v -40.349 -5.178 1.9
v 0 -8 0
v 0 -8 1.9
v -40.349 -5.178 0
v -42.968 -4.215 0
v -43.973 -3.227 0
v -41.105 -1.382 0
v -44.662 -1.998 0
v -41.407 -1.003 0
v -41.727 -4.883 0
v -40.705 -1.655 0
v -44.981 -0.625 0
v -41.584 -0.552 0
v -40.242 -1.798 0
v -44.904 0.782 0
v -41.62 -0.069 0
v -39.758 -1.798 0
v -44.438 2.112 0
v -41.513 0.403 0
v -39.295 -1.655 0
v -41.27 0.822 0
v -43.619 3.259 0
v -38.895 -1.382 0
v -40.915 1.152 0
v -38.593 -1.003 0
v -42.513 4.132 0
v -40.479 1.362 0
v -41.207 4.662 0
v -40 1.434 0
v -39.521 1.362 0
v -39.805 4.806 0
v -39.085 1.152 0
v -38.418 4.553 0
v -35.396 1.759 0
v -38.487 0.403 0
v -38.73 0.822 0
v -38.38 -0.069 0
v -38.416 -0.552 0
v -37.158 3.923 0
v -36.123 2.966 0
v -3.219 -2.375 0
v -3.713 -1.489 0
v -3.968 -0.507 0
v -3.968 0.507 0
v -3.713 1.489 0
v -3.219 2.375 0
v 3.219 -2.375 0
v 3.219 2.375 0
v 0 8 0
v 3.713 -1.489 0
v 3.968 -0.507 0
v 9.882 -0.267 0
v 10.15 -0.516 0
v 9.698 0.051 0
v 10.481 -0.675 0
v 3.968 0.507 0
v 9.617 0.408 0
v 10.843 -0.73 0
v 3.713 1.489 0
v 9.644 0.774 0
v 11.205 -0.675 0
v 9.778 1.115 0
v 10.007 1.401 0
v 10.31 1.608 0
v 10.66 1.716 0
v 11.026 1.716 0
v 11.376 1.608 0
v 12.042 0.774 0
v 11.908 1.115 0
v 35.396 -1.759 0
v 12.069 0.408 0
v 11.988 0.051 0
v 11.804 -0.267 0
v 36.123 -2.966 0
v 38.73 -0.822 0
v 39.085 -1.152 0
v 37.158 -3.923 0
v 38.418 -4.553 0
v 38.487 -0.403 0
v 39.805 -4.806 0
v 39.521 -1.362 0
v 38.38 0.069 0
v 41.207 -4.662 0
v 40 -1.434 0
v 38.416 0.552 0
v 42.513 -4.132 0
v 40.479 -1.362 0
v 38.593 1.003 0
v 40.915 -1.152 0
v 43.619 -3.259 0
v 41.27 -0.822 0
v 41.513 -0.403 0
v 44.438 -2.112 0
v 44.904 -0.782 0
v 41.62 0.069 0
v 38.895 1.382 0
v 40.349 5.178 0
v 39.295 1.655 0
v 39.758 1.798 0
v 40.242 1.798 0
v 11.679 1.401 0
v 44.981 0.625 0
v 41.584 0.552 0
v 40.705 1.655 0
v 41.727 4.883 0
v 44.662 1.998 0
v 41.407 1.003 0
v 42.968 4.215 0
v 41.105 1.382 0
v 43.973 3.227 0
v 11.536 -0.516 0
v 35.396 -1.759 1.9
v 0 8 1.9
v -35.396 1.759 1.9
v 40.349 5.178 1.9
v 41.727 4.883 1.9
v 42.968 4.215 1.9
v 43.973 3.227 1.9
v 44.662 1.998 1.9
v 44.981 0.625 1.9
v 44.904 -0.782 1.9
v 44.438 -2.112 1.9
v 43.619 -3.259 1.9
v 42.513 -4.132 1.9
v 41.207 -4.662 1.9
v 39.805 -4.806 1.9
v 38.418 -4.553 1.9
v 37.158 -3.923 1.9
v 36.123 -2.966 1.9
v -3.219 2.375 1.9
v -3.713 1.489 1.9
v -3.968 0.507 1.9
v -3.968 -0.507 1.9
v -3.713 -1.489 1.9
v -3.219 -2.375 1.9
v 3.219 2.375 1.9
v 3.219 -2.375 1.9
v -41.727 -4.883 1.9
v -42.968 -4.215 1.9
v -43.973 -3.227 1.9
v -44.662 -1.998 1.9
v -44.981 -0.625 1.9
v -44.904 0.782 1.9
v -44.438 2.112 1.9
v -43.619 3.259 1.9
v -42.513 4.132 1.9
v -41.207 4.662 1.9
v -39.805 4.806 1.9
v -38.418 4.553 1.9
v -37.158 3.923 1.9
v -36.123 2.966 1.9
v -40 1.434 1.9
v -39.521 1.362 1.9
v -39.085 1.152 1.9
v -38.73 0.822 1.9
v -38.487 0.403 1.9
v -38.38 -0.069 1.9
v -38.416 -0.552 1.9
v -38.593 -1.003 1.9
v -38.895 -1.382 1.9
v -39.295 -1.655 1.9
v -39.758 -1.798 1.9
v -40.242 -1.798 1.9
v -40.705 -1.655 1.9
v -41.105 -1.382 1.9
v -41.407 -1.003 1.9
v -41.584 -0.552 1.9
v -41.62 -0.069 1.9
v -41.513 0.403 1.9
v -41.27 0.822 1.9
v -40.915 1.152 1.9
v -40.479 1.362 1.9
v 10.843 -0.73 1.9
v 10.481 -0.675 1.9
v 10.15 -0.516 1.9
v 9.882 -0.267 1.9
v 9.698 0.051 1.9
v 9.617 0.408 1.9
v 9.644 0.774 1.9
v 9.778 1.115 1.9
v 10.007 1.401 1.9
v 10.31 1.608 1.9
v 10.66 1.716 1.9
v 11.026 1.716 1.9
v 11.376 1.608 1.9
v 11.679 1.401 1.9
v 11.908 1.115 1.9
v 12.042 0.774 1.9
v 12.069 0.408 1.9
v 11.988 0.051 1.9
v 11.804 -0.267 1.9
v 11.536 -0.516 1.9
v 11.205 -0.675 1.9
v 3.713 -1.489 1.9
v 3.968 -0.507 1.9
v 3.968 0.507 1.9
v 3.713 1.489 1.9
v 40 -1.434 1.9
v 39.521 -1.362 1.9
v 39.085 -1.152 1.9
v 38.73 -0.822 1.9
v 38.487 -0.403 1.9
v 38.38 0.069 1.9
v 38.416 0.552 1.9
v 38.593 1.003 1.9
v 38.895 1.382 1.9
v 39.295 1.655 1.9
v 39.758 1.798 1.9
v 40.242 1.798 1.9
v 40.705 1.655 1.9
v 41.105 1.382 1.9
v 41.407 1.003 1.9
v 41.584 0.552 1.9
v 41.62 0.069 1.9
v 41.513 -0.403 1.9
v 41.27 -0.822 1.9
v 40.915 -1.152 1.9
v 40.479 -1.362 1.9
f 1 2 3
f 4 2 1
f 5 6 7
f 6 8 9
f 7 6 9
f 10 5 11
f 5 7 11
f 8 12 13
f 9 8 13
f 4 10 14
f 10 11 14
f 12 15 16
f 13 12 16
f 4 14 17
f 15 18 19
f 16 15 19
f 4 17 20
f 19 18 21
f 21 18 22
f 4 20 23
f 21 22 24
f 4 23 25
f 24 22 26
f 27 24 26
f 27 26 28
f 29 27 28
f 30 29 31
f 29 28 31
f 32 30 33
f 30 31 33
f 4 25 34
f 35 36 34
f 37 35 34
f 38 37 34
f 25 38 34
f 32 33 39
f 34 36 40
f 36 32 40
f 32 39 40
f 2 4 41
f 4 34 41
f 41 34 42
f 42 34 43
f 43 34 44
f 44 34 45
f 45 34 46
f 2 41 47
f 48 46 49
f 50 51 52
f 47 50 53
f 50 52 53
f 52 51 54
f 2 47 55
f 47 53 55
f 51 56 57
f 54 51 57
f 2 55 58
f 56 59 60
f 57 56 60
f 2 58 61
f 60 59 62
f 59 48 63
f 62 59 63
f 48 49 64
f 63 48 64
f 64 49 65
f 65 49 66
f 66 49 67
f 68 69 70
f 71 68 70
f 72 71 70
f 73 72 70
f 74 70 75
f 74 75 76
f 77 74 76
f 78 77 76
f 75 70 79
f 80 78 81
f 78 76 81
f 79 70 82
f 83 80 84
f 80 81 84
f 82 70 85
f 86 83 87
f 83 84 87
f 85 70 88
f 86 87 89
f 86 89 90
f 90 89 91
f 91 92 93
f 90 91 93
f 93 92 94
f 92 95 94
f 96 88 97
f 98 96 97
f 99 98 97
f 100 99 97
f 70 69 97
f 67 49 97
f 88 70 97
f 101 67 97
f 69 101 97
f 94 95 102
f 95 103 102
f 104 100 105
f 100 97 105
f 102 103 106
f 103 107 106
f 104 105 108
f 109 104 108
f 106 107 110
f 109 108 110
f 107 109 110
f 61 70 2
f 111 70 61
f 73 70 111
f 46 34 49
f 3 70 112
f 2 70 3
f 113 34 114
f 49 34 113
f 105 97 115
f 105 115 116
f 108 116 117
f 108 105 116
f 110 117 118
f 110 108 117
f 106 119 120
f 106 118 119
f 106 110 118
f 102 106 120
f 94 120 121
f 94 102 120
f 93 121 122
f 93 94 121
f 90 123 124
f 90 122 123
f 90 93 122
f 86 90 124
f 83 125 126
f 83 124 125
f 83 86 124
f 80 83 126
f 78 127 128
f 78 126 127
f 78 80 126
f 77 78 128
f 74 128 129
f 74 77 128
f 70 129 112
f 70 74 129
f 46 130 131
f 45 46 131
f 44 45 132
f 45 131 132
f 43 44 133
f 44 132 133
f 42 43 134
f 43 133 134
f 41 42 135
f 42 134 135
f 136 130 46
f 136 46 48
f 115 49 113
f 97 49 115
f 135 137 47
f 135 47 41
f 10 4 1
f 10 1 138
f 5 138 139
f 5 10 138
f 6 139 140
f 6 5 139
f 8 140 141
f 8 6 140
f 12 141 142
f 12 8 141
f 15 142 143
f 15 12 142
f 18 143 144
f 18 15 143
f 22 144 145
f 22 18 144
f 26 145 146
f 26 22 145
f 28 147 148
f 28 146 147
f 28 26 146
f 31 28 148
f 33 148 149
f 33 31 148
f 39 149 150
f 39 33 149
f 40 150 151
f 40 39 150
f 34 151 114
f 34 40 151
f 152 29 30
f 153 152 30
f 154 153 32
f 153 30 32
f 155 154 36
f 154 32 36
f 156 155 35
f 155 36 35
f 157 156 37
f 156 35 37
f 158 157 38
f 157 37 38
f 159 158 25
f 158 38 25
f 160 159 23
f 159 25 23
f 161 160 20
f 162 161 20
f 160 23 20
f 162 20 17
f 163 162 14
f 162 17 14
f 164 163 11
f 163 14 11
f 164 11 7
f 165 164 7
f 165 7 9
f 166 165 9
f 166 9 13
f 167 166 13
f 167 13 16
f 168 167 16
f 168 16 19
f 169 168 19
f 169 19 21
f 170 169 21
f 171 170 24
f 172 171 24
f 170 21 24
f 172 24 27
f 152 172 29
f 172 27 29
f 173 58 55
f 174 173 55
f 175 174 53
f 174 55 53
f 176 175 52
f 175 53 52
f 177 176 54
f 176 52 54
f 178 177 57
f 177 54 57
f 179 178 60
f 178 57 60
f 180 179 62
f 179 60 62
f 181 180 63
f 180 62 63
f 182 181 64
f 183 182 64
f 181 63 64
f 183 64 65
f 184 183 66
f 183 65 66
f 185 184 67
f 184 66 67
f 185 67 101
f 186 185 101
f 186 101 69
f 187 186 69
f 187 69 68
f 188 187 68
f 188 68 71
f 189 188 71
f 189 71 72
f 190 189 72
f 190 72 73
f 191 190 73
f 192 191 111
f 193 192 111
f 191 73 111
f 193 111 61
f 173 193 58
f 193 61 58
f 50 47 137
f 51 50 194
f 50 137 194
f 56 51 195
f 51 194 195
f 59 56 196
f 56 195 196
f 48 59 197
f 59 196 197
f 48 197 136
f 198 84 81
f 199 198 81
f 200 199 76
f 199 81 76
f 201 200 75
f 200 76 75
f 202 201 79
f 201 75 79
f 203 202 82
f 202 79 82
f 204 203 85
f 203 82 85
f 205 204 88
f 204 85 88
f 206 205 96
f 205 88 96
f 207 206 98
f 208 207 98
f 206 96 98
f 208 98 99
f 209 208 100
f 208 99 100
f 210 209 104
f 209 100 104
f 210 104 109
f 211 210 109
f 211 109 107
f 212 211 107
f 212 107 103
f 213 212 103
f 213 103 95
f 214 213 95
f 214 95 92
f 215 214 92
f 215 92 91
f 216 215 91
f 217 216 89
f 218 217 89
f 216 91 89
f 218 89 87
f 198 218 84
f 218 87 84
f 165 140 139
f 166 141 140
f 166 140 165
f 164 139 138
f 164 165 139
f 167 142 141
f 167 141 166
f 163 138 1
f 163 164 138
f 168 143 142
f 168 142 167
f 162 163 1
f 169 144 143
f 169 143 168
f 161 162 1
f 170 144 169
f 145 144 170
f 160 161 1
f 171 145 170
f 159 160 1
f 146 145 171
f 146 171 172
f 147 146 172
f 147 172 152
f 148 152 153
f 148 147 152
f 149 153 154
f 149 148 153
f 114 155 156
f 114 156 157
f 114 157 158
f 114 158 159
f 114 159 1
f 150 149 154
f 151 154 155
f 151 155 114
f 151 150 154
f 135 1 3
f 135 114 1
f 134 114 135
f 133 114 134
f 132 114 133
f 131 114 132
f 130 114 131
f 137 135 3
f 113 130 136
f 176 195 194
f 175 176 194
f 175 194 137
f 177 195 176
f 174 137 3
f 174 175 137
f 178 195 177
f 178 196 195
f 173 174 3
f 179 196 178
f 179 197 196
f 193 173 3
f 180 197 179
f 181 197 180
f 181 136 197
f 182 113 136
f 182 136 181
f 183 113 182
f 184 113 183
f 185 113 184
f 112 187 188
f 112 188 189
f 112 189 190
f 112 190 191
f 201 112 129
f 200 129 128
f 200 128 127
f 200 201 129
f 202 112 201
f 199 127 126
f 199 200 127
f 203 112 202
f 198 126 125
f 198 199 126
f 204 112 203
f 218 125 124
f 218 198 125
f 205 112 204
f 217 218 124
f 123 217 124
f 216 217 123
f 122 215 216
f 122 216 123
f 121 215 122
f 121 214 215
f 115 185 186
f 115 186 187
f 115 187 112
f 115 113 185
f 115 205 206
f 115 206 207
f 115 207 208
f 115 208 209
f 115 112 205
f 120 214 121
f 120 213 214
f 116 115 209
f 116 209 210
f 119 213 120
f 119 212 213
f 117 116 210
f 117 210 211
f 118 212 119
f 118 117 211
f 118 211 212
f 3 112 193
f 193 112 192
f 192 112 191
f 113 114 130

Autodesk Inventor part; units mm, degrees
ref_plane "YZ Plane" through (0, 0, 0) normal (1, 0, 0) x (0, 1, 0)
ref_plane "XZ Plane" through (0, 0, 0) normal (0, 1, 0) x (-1, 0, 0)
ref_plane "XY Plane" through (0, 0, 0) normal (0, 0, 1) x (1, 0, 0)
sketch "Sketch1" plane through (0, 0, 0) normal (0, 0, 1) x (1, 0, 0)
  line L0 (0, 8) -> (0, -8)
  line L1 (0, 8) -> (40.3488, 5.1785)
  arc A0 (35.3957, -1.7588) -> (40.3488, 5.1785) centre (40, 0.1907) ccw
  line L2 (35.3957, -1.7588) -> (0, -8)
  line L3 (0, 0) -> (-17.0336, 0) construction
  dimension "d0" = 16
  dimension "d1" = 10
  dimension "d2" = 14
  dimension "d3" = 40
  dimension "d4" = 10
  dimension "d5" = 7.8093
extrude "Extrusion1" add sketch "Sketch1" along normal blind 1.9
hole "Hole1" at (40, 0.1907, 1.9) direction (0, 0, -1) diameter 3.25 end through all
thread "Thread1" size "M3.5x0.6" class "6H" standard "ANSI Metric M Profile" full length
pattern_circular "Circular Pattern1" count 2 over 360 about axis through (0, 0, -10) along (0, 0, 1)
sketch "Sketch2" plane through (0, 0, 1.9) normal (0, 0, 1) x (1, 0, 0)
  circle A0 centre (0, 0) radius 4
  line L0 (-3.2186, 2.375) -> (3.2186, 2.375)
  line L1 (3.2186, -2.375) -> (-3.2186, -2.375)
  dimension "d20" = 8
  dimension "d21" = 4.75
extrude "Extrusion2" cut sketch "Sketch2" against normal through all contours A0 L1 L0
sketch "Sketch3" plane through (0, 0, 1.9) normal (0, 0, 1) x (1, 0, 0)
  point P0 (0, 0)
  point P1 (10.843, 0.5)
  dimension "d24" = 10.843
  dimension "d25" = 0.5
hole "Hole2" at (10.843, 0.5, 1.9) direction (0, 0, -1) diameter 2.459 end through all thread size "M3x0.5" class "6H" standard "ANSI Metric M Profile"
properties part number "406-01" material "Aluminum-6061"
